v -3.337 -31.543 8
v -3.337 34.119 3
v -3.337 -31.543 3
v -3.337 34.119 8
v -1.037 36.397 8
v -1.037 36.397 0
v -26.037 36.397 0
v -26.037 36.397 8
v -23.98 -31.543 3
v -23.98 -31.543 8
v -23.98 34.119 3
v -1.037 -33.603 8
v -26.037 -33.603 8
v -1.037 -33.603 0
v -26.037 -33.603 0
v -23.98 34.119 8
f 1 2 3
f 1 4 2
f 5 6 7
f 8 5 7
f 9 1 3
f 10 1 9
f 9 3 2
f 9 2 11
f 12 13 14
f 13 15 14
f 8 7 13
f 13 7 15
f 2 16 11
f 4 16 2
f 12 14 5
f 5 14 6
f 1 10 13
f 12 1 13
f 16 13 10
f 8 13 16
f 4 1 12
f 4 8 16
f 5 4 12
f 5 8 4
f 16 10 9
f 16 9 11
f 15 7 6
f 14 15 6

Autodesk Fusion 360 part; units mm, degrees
sketch "Sketch1" plane through (0, 0, 0) normal (0, 0, 1) x (1, 0, 0)
  line L0 (-26.0373, -33.6026) -> (-1.0373, -33.6026)
  line L1 (-1.0373, -33.6026) -> (-1.0373, 36.3974)
  line L2 (-1.0373, 36.3974) -> (-26.0373, 36.3974)
  line L3 (-26.0373, 36.3974) -> (-26.0373, -33.6026)
  dimension "d1" = 25
  dimension "d2" = 70
extrude "Extrude1" add sketch "Sketch1" along normal blind 3
extrude "Extrude2" add 1 faces at (-17.7039, 13.0641, 3) along direction (0, 0, 1) blind 5
sketch "Sketch2" plane through (0, 0, 8) normal (0, 0, 1) x (-1, 0, 0)
  line L0 (26.0373, -36.3974) -> (26.0373, 33.6026)
  line L1 (26.0373, 33.6026) -> (1.0373, 33.6026)
  line L2 (1.0373, 33.6026) -> (1.0373, -36.3974)
  line L3 (1.0373, -36.3974) -> (26.0373, -36.3974)
  line L4 (23.98, -34.1191) -> (3.337, -34.1191)
  line L5 (3.337, -34.1191) -> (3.337, 31.543)
  line L6 (3.337, 31.543) -> (23.98, 31.543)
  line L7 (23.98, 31.543) -> (23.98, -34.1191)
extrude "Extrude3" cut sketch "Sketch2" against normal blind 5 contours L4 L5 L6 L7
